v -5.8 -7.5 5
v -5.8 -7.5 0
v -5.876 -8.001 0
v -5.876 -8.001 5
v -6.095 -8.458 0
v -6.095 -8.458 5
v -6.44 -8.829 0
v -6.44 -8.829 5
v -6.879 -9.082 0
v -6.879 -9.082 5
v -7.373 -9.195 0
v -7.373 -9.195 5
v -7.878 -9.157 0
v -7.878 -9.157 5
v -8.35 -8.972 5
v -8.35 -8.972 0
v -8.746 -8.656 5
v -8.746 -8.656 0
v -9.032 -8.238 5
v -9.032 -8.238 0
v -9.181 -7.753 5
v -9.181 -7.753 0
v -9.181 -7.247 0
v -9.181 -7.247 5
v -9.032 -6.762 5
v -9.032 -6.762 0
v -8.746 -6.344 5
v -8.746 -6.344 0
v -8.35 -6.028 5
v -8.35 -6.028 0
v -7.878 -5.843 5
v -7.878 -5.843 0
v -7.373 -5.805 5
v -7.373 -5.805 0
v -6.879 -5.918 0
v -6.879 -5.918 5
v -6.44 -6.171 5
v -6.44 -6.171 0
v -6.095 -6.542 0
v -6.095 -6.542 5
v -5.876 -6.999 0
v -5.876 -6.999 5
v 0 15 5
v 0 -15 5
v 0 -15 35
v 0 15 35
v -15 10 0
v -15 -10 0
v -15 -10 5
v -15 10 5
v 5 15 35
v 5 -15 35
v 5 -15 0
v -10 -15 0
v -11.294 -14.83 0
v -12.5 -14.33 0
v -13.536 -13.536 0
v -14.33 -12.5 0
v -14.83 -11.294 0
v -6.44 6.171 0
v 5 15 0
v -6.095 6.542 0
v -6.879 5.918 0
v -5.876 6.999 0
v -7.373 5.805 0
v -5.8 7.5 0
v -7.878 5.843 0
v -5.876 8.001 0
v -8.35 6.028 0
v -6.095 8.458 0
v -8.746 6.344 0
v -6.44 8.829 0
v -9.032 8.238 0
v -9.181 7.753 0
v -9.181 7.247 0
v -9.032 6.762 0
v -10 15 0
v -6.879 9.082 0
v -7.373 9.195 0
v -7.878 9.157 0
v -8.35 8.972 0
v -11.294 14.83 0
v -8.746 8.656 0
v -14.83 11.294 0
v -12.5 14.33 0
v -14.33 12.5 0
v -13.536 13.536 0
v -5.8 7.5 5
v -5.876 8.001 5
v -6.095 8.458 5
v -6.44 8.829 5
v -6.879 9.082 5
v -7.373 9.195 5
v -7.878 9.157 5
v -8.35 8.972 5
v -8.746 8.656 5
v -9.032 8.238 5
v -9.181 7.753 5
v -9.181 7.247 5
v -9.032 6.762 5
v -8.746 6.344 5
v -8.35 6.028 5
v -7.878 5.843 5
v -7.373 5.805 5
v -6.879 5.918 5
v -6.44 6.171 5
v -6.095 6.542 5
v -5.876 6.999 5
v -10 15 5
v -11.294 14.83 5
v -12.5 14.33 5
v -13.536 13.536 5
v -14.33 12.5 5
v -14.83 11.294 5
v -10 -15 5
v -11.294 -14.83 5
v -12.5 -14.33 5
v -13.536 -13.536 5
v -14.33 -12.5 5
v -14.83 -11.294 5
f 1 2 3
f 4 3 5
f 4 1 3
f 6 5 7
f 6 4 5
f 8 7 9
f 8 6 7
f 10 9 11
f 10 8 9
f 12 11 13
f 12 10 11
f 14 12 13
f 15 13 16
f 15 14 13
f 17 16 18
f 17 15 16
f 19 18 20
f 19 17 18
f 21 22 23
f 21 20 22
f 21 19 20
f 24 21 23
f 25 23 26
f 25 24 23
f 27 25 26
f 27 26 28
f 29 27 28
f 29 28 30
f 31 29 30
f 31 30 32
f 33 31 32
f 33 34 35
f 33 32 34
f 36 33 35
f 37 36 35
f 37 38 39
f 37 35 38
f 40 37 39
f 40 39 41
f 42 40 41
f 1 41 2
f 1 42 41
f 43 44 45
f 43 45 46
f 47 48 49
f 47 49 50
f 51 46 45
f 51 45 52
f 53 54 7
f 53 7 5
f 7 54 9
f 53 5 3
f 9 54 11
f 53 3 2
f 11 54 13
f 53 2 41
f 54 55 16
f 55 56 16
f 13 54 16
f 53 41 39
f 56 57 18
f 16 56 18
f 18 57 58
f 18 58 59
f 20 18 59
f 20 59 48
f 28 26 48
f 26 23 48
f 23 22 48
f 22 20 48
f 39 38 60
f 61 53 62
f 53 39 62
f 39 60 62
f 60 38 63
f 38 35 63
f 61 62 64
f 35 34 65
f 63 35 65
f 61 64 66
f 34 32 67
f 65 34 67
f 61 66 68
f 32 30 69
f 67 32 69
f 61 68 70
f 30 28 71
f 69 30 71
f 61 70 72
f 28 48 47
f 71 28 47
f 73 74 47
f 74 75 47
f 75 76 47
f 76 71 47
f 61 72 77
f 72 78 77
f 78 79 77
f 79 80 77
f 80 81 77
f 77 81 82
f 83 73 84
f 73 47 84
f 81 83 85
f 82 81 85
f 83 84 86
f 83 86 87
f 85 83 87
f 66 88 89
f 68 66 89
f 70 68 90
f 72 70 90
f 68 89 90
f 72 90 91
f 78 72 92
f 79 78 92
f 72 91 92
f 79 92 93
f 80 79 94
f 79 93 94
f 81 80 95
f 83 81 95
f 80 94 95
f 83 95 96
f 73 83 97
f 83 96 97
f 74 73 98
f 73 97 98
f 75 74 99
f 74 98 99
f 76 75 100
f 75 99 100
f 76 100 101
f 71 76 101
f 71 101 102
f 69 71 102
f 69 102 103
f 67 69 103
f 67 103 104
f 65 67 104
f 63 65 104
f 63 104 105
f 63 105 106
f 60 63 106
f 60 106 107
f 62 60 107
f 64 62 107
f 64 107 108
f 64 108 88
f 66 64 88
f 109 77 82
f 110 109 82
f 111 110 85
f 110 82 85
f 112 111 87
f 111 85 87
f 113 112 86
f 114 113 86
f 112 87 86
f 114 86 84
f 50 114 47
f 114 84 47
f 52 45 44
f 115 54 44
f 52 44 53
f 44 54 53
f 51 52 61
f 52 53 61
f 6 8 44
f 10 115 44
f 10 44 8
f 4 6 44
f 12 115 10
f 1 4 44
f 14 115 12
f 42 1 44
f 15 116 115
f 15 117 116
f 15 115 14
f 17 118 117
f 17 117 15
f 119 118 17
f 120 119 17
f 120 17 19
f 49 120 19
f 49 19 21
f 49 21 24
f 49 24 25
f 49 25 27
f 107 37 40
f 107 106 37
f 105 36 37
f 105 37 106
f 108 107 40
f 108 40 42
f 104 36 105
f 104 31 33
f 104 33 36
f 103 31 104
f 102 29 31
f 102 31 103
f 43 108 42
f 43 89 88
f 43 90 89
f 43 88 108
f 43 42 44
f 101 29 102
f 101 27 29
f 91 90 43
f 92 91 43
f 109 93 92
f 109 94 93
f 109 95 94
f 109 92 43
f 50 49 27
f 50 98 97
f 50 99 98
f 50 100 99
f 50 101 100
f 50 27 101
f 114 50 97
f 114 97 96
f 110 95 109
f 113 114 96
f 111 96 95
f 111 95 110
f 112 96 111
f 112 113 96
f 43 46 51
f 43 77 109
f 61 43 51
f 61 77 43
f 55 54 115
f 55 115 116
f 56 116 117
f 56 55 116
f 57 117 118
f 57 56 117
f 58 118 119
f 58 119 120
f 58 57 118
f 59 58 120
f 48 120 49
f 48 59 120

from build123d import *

# Parameters (mm, degrees)
PAD_DEPTH    = 5
SKETCH001_R  = 1.7
HOLE_DEPTH   = 72.8243
SKETCH002_W  = 30
SKETCH002_H  = 5
PAD001_DEPTH = 5
SKETCH003_W  = 5
SKETCH003_H  = 30
PAD002_DEPTH = 30


with BuildPart() as part:
    # Sketch → Pad (new body)
    with BuildSketch(Plane.XY):
        with BuildLine():
            Line((-15, 0), (0, 0))
            Line((0, 0), (0, 15))
            Line((0, 15), (-10, 15))
            ThreePointArc((-10, 15), (-13.535534, 13.535534), (-15, 10))
            Line((-15, 10), (-15, 0))
        make_face()
    pad = extrude(amount=PAD_DEPTH)

    # Mirrored: Pad across XZ
    add(pad.mirror(Plane.XZ))

    # Sketch001 (on Face5 of Mirrored) → Hole (cut, through all)
    with BuildSketch(Plane.XY.offset(5)):
        with Locations((-7.5, 7.5)):
            Circle(SKETCH001_R)
    hole = extrude(amount=-HOLE_DEPTH, mode=Mode.SUBTRACT)

    # Mirrored001: Hole across XZ
    add(hole.mirror(Plane.XZ), mode=Mode.SUBTRACT)

    # Sketch002 (on Face2 of Mirrored001) → Pad001 (join)
    with BuildSketch(Plane.YZ):
        with Locations((0, 2.5)):
            Rectangle(SKETCH002_W, SKETCH002_H)
    extrude(amount=PAD001_DEPTH)

    # Sketch003 (on Face12 of Pad001) → Pad002 (join)
    with BuildSketch(Plane.XY.offset(5)):
        with Locations((2.5, 0)):
            Rectangle(SKETCH003_W, SKETCH003_H)
    extrude(amount=PAD002_DEPTH)


solid = part.part
